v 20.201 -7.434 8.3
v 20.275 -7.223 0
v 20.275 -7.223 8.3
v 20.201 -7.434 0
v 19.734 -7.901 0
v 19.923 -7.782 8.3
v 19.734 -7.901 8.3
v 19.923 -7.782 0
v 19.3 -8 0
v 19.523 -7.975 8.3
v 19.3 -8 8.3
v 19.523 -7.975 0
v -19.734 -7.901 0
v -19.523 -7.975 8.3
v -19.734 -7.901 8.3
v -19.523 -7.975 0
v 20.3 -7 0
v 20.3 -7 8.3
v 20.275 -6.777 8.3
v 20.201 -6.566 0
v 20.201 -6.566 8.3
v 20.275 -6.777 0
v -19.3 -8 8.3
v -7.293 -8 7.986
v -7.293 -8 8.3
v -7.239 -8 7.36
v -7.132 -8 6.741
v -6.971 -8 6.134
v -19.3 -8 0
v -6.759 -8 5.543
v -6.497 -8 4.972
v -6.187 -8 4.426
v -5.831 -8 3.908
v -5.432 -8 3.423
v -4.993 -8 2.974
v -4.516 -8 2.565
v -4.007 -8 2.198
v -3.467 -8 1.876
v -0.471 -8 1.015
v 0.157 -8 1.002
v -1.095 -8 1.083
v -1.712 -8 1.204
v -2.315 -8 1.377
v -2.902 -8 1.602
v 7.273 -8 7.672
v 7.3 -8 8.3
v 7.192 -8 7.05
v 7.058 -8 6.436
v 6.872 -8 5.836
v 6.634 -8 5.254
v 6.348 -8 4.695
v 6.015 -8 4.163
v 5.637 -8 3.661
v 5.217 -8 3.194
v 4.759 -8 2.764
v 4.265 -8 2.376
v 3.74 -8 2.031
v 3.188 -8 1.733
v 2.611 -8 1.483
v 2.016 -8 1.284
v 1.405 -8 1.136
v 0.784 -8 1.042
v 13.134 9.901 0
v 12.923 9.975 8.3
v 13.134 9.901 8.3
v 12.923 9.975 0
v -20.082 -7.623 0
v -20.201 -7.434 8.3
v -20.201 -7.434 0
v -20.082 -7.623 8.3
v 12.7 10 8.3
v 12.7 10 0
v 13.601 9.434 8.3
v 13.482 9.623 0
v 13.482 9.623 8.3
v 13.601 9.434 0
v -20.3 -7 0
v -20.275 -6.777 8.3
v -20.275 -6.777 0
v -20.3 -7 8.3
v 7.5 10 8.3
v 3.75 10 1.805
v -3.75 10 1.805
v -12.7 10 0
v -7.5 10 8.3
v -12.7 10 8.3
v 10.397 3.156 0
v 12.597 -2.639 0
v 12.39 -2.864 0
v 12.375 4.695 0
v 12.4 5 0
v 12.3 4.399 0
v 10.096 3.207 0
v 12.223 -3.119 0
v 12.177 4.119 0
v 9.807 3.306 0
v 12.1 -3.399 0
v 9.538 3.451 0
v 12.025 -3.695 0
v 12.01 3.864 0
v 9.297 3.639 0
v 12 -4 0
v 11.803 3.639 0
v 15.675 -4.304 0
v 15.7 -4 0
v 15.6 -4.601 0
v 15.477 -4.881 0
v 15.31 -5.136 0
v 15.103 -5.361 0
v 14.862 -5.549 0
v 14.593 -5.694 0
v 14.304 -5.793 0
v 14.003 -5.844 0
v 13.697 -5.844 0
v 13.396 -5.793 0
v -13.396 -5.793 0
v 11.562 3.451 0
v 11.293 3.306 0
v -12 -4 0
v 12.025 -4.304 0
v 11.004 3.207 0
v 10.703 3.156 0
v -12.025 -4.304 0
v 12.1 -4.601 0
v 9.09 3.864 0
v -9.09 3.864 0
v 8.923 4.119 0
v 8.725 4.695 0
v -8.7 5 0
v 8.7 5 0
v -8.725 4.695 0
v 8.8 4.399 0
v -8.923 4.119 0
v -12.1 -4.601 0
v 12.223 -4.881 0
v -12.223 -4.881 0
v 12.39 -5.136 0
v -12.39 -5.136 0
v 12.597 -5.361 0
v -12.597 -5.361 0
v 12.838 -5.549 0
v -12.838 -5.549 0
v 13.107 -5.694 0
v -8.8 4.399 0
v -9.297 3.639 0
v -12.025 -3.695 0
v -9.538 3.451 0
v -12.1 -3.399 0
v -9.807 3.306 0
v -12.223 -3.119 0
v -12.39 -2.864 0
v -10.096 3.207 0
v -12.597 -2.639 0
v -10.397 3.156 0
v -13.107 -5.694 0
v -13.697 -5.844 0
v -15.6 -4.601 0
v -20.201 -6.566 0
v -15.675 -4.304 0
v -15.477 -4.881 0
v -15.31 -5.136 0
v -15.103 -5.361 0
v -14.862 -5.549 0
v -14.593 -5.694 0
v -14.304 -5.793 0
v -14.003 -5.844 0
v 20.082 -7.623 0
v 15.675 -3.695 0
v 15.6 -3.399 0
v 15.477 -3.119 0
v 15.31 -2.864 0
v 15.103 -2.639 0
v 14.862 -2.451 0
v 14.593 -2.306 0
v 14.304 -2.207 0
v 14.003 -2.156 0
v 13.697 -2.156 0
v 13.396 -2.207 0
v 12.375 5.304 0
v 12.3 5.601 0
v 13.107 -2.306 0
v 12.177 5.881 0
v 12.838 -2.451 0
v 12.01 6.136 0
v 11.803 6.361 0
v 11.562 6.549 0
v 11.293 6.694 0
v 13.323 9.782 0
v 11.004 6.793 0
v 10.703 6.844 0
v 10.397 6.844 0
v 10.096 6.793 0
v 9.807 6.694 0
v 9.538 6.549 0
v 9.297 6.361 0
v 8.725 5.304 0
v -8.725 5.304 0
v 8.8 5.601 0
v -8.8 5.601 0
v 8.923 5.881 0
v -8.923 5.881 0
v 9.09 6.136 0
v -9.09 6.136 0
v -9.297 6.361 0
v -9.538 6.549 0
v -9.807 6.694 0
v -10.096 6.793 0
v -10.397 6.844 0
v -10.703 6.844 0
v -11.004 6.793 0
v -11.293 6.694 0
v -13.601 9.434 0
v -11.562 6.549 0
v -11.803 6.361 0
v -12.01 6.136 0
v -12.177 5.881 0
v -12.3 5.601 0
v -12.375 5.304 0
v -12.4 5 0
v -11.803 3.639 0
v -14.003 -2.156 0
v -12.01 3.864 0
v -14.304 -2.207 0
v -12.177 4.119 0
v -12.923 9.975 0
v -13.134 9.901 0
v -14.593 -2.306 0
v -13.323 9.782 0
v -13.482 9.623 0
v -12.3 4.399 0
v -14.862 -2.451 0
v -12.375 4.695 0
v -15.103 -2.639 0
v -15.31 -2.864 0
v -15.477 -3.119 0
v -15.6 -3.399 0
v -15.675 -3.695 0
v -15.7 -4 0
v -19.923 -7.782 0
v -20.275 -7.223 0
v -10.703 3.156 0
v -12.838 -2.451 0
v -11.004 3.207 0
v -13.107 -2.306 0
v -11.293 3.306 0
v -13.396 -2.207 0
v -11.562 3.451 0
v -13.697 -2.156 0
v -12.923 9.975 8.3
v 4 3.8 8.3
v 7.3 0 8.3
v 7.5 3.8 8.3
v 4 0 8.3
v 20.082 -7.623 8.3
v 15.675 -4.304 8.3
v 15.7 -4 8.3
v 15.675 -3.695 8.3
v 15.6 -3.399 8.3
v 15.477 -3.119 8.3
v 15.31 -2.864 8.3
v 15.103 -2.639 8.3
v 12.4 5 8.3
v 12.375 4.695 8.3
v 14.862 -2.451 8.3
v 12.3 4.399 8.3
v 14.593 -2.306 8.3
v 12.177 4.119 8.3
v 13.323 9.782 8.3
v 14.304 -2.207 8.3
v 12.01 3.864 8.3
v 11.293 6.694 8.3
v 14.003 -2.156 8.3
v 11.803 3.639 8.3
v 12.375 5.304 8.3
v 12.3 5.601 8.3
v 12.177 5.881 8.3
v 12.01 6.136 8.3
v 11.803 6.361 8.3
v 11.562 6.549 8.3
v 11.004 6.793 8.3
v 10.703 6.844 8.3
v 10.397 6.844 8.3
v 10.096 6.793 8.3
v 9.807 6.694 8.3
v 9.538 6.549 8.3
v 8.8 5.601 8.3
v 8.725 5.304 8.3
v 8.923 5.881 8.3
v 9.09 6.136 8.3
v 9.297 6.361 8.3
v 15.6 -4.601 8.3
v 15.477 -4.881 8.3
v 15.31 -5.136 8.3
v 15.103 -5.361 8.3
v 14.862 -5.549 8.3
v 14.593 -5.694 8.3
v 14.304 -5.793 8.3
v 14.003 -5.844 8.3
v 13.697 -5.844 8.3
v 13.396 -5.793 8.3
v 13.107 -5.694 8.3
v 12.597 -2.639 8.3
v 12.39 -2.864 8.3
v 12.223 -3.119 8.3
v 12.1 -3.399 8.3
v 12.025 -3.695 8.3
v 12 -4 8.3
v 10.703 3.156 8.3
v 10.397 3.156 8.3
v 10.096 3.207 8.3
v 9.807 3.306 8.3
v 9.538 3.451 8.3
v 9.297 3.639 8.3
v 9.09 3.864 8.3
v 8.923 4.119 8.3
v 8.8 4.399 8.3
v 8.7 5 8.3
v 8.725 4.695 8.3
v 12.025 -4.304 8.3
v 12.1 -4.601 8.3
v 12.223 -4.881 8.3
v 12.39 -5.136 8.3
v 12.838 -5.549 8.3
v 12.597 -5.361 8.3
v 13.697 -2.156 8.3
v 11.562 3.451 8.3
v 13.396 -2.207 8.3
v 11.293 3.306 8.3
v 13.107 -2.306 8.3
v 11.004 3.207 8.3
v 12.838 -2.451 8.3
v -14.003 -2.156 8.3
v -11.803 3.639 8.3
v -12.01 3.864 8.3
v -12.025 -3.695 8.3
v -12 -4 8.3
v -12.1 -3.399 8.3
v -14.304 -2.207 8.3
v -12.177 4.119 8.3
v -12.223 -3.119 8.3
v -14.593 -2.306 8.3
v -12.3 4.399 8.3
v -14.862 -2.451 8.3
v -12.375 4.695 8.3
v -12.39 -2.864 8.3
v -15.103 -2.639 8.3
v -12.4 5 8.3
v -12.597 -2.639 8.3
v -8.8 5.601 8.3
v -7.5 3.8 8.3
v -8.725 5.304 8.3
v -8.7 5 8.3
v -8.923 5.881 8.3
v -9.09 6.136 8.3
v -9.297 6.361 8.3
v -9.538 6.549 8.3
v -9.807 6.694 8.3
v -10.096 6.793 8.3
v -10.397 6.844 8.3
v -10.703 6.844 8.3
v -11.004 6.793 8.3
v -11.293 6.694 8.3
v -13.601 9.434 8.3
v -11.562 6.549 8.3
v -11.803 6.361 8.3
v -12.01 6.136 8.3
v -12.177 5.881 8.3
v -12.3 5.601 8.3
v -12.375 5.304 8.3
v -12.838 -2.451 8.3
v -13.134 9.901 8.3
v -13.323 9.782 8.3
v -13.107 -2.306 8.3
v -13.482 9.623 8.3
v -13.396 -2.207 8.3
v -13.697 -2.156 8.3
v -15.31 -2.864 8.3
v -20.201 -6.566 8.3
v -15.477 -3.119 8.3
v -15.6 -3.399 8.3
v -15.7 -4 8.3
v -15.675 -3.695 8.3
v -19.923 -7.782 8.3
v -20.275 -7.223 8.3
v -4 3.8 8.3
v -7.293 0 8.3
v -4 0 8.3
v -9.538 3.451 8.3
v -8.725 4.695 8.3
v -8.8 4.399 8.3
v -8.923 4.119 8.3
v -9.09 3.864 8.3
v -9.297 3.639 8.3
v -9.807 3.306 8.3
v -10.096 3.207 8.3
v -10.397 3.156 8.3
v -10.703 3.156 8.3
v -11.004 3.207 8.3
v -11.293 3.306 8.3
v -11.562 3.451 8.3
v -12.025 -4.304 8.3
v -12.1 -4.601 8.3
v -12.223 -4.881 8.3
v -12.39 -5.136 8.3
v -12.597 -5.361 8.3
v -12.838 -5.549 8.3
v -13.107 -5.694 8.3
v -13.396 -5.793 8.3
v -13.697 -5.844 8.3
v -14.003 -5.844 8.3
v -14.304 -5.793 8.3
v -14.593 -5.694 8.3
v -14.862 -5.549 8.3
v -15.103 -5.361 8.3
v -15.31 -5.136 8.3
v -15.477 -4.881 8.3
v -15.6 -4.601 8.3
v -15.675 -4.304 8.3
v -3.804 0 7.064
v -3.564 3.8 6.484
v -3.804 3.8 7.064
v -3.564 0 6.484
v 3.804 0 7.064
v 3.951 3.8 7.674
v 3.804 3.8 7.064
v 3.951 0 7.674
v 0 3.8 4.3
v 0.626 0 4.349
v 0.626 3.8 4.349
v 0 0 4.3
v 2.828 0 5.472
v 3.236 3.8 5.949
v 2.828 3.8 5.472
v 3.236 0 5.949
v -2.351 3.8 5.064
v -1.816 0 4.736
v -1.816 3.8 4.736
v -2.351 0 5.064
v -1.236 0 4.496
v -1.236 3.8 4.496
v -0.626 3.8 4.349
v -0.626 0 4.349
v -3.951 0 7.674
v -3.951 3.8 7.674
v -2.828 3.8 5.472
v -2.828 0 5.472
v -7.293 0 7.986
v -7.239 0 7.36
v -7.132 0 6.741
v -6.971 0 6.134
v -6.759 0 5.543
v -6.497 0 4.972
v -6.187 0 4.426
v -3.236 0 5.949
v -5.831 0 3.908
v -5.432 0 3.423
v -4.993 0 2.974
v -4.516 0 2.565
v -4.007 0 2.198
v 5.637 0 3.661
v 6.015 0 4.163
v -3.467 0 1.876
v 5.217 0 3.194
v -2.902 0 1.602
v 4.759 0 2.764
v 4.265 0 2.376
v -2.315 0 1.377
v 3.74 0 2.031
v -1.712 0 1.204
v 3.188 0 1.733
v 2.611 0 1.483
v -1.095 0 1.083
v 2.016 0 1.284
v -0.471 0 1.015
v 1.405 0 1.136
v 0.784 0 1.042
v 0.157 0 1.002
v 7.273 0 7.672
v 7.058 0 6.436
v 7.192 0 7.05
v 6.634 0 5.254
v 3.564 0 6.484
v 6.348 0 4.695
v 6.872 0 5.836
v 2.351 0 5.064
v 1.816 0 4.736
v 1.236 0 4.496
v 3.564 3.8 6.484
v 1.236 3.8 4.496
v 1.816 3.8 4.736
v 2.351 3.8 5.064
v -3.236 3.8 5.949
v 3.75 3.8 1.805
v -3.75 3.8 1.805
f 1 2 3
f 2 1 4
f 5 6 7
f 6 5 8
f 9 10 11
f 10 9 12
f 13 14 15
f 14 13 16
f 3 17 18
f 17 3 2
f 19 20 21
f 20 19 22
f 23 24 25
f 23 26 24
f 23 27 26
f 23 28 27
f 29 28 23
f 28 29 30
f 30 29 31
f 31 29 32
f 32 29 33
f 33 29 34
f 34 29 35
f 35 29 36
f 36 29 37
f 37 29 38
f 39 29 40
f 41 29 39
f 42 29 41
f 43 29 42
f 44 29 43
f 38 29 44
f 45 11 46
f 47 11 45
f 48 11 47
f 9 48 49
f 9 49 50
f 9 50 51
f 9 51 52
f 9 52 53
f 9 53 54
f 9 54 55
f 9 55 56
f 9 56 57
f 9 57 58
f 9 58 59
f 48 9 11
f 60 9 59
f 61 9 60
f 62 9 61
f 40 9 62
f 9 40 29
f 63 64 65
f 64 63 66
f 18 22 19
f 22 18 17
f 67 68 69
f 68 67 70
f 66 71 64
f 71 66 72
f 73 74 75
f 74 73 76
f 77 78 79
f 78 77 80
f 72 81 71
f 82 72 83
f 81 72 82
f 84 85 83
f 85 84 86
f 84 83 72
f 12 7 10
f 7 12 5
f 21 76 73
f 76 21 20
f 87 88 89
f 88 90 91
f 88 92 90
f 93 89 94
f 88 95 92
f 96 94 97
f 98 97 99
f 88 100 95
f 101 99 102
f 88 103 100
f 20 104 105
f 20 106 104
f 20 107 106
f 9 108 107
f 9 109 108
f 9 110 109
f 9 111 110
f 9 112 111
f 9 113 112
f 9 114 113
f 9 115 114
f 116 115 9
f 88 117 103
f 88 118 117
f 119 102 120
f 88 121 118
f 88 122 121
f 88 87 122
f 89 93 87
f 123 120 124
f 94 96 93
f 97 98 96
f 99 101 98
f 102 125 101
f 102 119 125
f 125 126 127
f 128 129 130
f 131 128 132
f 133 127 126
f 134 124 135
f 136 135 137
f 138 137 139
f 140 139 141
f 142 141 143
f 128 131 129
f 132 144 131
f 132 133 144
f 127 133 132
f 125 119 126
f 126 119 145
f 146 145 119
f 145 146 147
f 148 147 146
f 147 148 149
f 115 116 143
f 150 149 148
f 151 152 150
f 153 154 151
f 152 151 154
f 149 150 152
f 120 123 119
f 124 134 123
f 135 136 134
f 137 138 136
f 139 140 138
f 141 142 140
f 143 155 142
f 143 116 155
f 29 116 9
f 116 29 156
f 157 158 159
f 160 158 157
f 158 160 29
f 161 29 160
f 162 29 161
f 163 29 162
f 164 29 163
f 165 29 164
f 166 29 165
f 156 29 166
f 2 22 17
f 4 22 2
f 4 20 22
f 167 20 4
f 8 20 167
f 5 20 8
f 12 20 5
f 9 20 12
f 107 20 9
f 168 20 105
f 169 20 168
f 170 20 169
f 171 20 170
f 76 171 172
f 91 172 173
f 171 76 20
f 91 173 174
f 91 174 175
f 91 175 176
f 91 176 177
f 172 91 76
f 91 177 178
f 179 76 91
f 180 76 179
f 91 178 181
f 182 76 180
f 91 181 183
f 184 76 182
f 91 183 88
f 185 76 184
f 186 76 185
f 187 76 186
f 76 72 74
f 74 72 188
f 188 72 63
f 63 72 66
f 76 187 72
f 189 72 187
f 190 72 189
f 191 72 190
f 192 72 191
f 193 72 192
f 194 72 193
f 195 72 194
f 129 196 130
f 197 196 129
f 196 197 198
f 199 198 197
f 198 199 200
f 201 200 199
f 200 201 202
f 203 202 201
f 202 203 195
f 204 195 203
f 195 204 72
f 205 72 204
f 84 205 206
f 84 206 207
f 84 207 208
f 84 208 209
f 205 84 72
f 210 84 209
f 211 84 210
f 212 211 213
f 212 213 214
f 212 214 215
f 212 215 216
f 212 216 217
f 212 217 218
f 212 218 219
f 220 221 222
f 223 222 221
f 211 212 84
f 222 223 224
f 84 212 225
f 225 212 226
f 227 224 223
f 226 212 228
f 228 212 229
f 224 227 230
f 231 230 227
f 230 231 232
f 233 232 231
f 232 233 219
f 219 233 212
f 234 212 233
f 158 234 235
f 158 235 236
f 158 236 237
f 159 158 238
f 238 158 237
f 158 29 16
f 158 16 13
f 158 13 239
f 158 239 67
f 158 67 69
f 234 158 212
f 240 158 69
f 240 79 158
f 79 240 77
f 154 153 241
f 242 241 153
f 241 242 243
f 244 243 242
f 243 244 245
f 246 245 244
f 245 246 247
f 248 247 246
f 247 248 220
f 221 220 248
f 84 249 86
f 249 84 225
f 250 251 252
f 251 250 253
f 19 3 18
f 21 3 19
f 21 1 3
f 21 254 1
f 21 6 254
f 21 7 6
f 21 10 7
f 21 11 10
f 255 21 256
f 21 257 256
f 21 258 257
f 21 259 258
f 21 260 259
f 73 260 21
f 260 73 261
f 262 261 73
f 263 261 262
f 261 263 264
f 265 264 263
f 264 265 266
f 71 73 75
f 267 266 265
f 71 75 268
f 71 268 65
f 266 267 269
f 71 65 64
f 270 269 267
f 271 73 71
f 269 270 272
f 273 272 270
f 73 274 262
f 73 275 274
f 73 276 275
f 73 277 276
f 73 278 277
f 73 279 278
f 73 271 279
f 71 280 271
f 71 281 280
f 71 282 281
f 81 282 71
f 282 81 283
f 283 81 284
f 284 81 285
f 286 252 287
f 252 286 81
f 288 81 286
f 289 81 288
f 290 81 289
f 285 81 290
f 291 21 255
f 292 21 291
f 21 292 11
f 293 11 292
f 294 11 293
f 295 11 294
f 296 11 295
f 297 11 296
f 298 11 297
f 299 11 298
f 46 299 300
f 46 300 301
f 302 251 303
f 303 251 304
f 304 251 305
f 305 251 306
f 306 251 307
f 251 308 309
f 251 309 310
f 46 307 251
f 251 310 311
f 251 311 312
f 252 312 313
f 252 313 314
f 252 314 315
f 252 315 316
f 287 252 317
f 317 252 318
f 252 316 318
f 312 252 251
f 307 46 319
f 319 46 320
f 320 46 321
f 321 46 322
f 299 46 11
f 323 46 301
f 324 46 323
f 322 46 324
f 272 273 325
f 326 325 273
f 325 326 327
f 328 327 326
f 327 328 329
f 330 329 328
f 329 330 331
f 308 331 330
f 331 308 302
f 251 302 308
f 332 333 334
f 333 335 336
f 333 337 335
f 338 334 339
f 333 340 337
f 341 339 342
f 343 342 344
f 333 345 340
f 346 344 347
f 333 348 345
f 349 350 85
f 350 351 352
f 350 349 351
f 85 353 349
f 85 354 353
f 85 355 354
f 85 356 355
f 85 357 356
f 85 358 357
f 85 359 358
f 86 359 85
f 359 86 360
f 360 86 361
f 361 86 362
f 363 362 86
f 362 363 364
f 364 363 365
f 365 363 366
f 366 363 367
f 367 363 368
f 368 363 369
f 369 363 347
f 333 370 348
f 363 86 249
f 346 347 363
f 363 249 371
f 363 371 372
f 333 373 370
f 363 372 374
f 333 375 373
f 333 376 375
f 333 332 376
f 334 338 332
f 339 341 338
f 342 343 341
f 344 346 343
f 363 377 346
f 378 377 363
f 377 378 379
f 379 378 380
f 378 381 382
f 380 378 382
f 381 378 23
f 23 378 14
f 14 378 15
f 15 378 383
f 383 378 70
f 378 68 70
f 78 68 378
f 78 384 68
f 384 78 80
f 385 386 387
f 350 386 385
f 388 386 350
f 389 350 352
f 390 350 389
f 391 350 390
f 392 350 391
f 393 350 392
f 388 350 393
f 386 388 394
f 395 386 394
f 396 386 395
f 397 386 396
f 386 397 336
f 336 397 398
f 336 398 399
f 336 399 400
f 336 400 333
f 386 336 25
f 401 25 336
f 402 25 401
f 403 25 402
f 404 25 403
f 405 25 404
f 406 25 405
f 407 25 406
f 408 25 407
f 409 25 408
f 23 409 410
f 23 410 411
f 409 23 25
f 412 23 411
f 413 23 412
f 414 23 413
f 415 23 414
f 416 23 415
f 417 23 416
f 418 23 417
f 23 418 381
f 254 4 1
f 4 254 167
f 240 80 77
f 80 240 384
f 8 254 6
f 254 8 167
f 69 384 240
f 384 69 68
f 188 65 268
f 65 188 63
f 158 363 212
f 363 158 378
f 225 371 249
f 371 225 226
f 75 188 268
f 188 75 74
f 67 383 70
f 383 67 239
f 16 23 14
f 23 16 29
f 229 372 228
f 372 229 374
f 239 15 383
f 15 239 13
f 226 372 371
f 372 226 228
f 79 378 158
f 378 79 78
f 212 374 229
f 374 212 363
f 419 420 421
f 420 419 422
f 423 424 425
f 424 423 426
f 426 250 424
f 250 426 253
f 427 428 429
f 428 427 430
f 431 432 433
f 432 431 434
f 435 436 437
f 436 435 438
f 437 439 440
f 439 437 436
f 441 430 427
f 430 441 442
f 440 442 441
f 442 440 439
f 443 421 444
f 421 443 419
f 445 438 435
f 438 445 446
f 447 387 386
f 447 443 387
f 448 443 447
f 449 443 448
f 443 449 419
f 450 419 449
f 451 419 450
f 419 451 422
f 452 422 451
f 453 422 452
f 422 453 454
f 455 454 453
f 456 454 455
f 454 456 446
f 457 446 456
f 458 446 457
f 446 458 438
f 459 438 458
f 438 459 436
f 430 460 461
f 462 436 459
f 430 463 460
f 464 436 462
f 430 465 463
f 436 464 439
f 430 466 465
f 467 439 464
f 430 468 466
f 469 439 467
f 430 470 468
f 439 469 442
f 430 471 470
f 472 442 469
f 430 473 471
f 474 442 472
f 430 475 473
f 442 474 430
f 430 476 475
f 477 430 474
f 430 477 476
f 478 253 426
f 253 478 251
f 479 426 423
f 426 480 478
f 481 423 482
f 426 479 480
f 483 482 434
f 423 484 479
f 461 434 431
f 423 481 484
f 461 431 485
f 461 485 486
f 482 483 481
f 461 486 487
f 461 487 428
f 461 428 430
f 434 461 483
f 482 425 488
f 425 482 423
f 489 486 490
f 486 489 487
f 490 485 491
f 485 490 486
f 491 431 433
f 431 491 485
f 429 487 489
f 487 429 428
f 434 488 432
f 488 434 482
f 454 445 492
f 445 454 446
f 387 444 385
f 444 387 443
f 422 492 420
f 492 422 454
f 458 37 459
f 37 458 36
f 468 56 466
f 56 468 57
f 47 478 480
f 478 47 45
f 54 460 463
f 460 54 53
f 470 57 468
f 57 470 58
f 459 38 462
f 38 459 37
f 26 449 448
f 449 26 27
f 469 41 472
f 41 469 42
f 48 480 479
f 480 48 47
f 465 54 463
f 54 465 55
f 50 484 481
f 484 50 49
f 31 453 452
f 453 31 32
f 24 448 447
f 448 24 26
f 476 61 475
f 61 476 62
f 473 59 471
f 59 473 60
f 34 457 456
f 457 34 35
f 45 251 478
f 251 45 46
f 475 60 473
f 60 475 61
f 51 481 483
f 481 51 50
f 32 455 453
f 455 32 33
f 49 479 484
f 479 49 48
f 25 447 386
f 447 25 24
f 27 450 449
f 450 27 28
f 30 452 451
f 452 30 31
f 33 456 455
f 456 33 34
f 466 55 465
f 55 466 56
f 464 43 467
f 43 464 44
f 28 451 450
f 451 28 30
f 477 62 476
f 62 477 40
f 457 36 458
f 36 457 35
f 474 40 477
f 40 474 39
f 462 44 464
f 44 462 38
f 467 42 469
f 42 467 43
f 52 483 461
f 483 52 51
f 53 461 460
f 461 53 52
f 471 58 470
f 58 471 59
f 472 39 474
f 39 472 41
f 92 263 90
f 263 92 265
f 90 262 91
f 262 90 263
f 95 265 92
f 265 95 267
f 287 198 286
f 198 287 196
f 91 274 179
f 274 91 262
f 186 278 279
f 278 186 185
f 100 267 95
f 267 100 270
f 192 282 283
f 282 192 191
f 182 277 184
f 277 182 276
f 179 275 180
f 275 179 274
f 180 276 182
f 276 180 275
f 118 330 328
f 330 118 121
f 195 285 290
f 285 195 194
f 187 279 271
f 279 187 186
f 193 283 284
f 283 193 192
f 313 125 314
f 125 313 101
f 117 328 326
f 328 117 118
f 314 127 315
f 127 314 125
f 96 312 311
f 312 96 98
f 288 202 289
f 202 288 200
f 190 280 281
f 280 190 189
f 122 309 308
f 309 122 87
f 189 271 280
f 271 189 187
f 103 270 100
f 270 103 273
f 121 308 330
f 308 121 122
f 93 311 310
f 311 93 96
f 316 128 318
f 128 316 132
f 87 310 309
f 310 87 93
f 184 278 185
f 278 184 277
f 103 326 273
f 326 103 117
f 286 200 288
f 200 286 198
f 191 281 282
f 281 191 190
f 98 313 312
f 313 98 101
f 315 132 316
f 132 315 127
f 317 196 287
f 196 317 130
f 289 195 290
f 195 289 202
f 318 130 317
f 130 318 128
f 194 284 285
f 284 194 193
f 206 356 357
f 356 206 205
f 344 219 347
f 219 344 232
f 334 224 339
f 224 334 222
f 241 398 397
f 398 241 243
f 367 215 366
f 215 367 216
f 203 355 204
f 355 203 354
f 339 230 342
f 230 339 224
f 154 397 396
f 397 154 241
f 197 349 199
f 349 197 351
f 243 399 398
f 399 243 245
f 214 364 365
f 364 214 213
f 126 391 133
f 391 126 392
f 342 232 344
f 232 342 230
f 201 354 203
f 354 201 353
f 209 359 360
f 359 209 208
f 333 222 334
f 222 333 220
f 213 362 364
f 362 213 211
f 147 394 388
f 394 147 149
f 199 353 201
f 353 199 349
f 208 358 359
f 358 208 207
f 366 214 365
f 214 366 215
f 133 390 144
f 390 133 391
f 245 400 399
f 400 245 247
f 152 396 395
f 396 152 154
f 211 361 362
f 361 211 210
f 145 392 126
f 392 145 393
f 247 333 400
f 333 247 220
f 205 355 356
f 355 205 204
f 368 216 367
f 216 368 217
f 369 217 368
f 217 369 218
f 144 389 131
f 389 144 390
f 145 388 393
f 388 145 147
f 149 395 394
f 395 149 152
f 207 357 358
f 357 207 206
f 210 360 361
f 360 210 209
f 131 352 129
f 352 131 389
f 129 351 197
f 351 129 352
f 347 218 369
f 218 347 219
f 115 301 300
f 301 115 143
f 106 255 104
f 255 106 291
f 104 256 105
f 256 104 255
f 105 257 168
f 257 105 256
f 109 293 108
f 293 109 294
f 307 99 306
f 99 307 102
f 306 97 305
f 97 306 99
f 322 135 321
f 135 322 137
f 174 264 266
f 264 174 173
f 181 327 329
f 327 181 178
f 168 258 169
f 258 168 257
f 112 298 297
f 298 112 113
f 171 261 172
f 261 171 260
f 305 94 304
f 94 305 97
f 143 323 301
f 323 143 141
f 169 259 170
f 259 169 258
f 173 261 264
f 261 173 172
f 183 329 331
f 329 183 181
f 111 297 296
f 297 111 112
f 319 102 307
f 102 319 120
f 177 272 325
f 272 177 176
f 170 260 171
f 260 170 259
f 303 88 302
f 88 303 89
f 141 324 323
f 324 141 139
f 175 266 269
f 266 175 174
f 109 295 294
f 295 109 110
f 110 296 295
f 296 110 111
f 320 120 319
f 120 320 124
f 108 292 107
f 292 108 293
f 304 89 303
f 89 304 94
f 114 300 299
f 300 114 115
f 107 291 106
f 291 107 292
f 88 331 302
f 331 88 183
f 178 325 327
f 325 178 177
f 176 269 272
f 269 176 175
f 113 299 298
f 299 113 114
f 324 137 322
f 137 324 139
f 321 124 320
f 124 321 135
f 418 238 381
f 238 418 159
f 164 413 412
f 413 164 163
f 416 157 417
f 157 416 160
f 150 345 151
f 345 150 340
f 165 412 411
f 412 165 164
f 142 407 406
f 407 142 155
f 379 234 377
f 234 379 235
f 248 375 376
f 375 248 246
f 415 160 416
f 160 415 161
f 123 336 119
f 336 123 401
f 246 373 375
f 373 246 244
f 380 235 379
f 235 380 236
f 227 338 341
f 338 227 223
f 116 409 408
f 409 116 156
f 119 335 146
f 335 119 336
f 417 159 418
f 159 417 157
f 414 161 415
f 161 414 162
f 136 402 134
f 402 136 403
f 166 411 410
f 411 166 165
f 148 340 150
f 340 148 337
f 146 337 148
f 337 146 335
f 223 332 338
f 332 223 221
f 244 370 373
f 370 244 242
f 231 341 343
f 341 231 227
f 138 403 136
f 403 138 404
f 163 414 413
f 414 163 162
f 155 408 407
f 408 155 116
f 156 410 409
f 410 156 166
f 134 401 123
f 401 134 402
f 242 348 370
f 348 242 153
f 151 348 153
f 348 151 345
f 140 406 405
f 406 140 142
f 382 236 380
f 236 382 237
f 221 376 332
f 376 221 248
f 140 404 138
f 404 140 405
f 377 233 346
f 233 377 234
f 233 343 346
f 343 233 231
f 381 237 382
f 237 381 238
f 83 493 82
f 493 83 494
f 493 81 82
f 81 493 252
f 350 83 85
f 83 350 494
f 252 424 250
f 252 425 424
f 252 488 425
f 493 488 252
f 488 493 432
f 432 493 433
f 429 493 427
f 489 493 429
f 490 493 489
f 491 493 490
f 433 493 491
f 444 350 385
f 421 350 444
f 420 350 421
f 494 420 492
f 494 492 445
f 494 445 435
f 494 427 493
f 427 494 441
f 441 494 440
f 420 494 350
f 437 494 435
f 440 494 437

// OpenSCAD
shaft_diameter_a = 8;
nut_diameter_a = 15;
nut_length_a = 6.4;
shaft_length_a = 10;

shaft_diameter_b = 14.6;
nut_diameter_b = 5;
nut_length_b = 6.4;
shaft_length_b = 8;

coupler_mount_hole_diameter = 3.7;
coupler_extra_thickness = 1;

thickest_diam = shaft_diameter_a > shaft_diameter_b ? shaft_diameter_a : shaft_diameter_b;

translate([0,0,thickest_diam/2 + coupler_extra_thickness])
rotate([180,0,0])
{

    difference()
    {
        hull()
        {
            translate([
                        shaft_diameter_a + (1*coupler_extra_thickness) + coupler_mount_hole_diameter,
            -(shaft_length_a -coupler_extra_thickness),0])
            cylinder(r=coupler_extra_thickness,h=thickest_diam/2 + coupler_extra_thickness, $fn=28);

            mirror([1,0,0])
            translate([
                        shaft_diameter_a + (1*coupler_extra_thickness) + coupler_mount_hole_diameter,
            -(shaft_length_a -coupler_extra_thickness),0])
            cylinder(r=coupler_extra_thickness,h=thickest_diam/2 + coupler_extra_thickness, $fn=28);


            translate([
                        shaft_diameter_b + (1*coupler_extra_thickness) + coupler_mount_hole_diameter,
            (shaft_length_b -coupler_extra_thickness),0])
            cylinder(r=coupler_extra_thickness,h=thickest_diam/2 + coupler_extra_thickness, $fn=28);

            mirror([1,0,0])
            translate([
                        shaft_diameter_b + (1*coupler_extra_thickness) + coupler_mount_hole_diameter,
            (shaft_length_b -coupler_extra_thickness),0])
            cylinder(r=coupler_extra_thickness,h=thickest_diam/2 + coupler_extra_thickness, $fn=28);
        }

        color("Red")
        rotate([90,0,0])
        cylinder(r=shaft_diameter_a/2,h=shaft_length_a+1,$fn=shaft_diameter_a*5);

        color("Blue")
        rotate([-90,0,0])
        cylinder(r=shaft_diameter_b/2,h=shaft_length_b+1,$fn=shaft_diameter_b*5);

        /*
         *
         *  Mounting
         *
         */
        color("Green")
        translate([shaft_diameter_a/2 + coupler_extra_thickness + coupler_mount_hole_diameter*1.5,-shaft_length_a/2,0])
        cylinder(r=coupler_mount_hole_diameter/2,h=50,$fn=38);

        mirror([1,0,0])
        color("Green")
        translate([shaft_diameter_a/2 + coupler_extra_thickness + coupler_mount_hole_diameter*1.5,-shaft_length_a/2,0])
        cylinder(r=coupler_mount_hole_diameter/2,h=50,$fn=38);

        color("Green")
        translate([shaft_diameter_b/2 + coupler_extra_thickness + coupler_mount_hole_diameter*1.5,shaft_length_b/2,0])
        cylinder(r=coupler_mount_hole_diameter/2,h=50,$fn=38);

        mirror([1,0,0])
        color("Green")
        translate([shaft_diameter_b/2 + coupler_extra_thickness + coupler_mount_hole_diameter*1.5,shaft_length_b/2,0])
        cylinder(r=coupler_mount_hole_diameter/2,h=50,$fn=38);

        /*
         *
         *  Nut
         *
         */

        color("Red")
        translate([0,-shaft_length_a+nut_length_a - 0.2,0])
        rotate([90,0,0])
        cylinder(r=nut_diameter_a/2,h=nut_length_a,$fn=6);

        color("Blue")
        translate([0,shaft_length_b-nut_length_b + 0.2,0])
        rotate([-90,0,0])
        cylinder(r=nut_diameter_b/2,h=nut_length_b,$fn=6);
    }
}
